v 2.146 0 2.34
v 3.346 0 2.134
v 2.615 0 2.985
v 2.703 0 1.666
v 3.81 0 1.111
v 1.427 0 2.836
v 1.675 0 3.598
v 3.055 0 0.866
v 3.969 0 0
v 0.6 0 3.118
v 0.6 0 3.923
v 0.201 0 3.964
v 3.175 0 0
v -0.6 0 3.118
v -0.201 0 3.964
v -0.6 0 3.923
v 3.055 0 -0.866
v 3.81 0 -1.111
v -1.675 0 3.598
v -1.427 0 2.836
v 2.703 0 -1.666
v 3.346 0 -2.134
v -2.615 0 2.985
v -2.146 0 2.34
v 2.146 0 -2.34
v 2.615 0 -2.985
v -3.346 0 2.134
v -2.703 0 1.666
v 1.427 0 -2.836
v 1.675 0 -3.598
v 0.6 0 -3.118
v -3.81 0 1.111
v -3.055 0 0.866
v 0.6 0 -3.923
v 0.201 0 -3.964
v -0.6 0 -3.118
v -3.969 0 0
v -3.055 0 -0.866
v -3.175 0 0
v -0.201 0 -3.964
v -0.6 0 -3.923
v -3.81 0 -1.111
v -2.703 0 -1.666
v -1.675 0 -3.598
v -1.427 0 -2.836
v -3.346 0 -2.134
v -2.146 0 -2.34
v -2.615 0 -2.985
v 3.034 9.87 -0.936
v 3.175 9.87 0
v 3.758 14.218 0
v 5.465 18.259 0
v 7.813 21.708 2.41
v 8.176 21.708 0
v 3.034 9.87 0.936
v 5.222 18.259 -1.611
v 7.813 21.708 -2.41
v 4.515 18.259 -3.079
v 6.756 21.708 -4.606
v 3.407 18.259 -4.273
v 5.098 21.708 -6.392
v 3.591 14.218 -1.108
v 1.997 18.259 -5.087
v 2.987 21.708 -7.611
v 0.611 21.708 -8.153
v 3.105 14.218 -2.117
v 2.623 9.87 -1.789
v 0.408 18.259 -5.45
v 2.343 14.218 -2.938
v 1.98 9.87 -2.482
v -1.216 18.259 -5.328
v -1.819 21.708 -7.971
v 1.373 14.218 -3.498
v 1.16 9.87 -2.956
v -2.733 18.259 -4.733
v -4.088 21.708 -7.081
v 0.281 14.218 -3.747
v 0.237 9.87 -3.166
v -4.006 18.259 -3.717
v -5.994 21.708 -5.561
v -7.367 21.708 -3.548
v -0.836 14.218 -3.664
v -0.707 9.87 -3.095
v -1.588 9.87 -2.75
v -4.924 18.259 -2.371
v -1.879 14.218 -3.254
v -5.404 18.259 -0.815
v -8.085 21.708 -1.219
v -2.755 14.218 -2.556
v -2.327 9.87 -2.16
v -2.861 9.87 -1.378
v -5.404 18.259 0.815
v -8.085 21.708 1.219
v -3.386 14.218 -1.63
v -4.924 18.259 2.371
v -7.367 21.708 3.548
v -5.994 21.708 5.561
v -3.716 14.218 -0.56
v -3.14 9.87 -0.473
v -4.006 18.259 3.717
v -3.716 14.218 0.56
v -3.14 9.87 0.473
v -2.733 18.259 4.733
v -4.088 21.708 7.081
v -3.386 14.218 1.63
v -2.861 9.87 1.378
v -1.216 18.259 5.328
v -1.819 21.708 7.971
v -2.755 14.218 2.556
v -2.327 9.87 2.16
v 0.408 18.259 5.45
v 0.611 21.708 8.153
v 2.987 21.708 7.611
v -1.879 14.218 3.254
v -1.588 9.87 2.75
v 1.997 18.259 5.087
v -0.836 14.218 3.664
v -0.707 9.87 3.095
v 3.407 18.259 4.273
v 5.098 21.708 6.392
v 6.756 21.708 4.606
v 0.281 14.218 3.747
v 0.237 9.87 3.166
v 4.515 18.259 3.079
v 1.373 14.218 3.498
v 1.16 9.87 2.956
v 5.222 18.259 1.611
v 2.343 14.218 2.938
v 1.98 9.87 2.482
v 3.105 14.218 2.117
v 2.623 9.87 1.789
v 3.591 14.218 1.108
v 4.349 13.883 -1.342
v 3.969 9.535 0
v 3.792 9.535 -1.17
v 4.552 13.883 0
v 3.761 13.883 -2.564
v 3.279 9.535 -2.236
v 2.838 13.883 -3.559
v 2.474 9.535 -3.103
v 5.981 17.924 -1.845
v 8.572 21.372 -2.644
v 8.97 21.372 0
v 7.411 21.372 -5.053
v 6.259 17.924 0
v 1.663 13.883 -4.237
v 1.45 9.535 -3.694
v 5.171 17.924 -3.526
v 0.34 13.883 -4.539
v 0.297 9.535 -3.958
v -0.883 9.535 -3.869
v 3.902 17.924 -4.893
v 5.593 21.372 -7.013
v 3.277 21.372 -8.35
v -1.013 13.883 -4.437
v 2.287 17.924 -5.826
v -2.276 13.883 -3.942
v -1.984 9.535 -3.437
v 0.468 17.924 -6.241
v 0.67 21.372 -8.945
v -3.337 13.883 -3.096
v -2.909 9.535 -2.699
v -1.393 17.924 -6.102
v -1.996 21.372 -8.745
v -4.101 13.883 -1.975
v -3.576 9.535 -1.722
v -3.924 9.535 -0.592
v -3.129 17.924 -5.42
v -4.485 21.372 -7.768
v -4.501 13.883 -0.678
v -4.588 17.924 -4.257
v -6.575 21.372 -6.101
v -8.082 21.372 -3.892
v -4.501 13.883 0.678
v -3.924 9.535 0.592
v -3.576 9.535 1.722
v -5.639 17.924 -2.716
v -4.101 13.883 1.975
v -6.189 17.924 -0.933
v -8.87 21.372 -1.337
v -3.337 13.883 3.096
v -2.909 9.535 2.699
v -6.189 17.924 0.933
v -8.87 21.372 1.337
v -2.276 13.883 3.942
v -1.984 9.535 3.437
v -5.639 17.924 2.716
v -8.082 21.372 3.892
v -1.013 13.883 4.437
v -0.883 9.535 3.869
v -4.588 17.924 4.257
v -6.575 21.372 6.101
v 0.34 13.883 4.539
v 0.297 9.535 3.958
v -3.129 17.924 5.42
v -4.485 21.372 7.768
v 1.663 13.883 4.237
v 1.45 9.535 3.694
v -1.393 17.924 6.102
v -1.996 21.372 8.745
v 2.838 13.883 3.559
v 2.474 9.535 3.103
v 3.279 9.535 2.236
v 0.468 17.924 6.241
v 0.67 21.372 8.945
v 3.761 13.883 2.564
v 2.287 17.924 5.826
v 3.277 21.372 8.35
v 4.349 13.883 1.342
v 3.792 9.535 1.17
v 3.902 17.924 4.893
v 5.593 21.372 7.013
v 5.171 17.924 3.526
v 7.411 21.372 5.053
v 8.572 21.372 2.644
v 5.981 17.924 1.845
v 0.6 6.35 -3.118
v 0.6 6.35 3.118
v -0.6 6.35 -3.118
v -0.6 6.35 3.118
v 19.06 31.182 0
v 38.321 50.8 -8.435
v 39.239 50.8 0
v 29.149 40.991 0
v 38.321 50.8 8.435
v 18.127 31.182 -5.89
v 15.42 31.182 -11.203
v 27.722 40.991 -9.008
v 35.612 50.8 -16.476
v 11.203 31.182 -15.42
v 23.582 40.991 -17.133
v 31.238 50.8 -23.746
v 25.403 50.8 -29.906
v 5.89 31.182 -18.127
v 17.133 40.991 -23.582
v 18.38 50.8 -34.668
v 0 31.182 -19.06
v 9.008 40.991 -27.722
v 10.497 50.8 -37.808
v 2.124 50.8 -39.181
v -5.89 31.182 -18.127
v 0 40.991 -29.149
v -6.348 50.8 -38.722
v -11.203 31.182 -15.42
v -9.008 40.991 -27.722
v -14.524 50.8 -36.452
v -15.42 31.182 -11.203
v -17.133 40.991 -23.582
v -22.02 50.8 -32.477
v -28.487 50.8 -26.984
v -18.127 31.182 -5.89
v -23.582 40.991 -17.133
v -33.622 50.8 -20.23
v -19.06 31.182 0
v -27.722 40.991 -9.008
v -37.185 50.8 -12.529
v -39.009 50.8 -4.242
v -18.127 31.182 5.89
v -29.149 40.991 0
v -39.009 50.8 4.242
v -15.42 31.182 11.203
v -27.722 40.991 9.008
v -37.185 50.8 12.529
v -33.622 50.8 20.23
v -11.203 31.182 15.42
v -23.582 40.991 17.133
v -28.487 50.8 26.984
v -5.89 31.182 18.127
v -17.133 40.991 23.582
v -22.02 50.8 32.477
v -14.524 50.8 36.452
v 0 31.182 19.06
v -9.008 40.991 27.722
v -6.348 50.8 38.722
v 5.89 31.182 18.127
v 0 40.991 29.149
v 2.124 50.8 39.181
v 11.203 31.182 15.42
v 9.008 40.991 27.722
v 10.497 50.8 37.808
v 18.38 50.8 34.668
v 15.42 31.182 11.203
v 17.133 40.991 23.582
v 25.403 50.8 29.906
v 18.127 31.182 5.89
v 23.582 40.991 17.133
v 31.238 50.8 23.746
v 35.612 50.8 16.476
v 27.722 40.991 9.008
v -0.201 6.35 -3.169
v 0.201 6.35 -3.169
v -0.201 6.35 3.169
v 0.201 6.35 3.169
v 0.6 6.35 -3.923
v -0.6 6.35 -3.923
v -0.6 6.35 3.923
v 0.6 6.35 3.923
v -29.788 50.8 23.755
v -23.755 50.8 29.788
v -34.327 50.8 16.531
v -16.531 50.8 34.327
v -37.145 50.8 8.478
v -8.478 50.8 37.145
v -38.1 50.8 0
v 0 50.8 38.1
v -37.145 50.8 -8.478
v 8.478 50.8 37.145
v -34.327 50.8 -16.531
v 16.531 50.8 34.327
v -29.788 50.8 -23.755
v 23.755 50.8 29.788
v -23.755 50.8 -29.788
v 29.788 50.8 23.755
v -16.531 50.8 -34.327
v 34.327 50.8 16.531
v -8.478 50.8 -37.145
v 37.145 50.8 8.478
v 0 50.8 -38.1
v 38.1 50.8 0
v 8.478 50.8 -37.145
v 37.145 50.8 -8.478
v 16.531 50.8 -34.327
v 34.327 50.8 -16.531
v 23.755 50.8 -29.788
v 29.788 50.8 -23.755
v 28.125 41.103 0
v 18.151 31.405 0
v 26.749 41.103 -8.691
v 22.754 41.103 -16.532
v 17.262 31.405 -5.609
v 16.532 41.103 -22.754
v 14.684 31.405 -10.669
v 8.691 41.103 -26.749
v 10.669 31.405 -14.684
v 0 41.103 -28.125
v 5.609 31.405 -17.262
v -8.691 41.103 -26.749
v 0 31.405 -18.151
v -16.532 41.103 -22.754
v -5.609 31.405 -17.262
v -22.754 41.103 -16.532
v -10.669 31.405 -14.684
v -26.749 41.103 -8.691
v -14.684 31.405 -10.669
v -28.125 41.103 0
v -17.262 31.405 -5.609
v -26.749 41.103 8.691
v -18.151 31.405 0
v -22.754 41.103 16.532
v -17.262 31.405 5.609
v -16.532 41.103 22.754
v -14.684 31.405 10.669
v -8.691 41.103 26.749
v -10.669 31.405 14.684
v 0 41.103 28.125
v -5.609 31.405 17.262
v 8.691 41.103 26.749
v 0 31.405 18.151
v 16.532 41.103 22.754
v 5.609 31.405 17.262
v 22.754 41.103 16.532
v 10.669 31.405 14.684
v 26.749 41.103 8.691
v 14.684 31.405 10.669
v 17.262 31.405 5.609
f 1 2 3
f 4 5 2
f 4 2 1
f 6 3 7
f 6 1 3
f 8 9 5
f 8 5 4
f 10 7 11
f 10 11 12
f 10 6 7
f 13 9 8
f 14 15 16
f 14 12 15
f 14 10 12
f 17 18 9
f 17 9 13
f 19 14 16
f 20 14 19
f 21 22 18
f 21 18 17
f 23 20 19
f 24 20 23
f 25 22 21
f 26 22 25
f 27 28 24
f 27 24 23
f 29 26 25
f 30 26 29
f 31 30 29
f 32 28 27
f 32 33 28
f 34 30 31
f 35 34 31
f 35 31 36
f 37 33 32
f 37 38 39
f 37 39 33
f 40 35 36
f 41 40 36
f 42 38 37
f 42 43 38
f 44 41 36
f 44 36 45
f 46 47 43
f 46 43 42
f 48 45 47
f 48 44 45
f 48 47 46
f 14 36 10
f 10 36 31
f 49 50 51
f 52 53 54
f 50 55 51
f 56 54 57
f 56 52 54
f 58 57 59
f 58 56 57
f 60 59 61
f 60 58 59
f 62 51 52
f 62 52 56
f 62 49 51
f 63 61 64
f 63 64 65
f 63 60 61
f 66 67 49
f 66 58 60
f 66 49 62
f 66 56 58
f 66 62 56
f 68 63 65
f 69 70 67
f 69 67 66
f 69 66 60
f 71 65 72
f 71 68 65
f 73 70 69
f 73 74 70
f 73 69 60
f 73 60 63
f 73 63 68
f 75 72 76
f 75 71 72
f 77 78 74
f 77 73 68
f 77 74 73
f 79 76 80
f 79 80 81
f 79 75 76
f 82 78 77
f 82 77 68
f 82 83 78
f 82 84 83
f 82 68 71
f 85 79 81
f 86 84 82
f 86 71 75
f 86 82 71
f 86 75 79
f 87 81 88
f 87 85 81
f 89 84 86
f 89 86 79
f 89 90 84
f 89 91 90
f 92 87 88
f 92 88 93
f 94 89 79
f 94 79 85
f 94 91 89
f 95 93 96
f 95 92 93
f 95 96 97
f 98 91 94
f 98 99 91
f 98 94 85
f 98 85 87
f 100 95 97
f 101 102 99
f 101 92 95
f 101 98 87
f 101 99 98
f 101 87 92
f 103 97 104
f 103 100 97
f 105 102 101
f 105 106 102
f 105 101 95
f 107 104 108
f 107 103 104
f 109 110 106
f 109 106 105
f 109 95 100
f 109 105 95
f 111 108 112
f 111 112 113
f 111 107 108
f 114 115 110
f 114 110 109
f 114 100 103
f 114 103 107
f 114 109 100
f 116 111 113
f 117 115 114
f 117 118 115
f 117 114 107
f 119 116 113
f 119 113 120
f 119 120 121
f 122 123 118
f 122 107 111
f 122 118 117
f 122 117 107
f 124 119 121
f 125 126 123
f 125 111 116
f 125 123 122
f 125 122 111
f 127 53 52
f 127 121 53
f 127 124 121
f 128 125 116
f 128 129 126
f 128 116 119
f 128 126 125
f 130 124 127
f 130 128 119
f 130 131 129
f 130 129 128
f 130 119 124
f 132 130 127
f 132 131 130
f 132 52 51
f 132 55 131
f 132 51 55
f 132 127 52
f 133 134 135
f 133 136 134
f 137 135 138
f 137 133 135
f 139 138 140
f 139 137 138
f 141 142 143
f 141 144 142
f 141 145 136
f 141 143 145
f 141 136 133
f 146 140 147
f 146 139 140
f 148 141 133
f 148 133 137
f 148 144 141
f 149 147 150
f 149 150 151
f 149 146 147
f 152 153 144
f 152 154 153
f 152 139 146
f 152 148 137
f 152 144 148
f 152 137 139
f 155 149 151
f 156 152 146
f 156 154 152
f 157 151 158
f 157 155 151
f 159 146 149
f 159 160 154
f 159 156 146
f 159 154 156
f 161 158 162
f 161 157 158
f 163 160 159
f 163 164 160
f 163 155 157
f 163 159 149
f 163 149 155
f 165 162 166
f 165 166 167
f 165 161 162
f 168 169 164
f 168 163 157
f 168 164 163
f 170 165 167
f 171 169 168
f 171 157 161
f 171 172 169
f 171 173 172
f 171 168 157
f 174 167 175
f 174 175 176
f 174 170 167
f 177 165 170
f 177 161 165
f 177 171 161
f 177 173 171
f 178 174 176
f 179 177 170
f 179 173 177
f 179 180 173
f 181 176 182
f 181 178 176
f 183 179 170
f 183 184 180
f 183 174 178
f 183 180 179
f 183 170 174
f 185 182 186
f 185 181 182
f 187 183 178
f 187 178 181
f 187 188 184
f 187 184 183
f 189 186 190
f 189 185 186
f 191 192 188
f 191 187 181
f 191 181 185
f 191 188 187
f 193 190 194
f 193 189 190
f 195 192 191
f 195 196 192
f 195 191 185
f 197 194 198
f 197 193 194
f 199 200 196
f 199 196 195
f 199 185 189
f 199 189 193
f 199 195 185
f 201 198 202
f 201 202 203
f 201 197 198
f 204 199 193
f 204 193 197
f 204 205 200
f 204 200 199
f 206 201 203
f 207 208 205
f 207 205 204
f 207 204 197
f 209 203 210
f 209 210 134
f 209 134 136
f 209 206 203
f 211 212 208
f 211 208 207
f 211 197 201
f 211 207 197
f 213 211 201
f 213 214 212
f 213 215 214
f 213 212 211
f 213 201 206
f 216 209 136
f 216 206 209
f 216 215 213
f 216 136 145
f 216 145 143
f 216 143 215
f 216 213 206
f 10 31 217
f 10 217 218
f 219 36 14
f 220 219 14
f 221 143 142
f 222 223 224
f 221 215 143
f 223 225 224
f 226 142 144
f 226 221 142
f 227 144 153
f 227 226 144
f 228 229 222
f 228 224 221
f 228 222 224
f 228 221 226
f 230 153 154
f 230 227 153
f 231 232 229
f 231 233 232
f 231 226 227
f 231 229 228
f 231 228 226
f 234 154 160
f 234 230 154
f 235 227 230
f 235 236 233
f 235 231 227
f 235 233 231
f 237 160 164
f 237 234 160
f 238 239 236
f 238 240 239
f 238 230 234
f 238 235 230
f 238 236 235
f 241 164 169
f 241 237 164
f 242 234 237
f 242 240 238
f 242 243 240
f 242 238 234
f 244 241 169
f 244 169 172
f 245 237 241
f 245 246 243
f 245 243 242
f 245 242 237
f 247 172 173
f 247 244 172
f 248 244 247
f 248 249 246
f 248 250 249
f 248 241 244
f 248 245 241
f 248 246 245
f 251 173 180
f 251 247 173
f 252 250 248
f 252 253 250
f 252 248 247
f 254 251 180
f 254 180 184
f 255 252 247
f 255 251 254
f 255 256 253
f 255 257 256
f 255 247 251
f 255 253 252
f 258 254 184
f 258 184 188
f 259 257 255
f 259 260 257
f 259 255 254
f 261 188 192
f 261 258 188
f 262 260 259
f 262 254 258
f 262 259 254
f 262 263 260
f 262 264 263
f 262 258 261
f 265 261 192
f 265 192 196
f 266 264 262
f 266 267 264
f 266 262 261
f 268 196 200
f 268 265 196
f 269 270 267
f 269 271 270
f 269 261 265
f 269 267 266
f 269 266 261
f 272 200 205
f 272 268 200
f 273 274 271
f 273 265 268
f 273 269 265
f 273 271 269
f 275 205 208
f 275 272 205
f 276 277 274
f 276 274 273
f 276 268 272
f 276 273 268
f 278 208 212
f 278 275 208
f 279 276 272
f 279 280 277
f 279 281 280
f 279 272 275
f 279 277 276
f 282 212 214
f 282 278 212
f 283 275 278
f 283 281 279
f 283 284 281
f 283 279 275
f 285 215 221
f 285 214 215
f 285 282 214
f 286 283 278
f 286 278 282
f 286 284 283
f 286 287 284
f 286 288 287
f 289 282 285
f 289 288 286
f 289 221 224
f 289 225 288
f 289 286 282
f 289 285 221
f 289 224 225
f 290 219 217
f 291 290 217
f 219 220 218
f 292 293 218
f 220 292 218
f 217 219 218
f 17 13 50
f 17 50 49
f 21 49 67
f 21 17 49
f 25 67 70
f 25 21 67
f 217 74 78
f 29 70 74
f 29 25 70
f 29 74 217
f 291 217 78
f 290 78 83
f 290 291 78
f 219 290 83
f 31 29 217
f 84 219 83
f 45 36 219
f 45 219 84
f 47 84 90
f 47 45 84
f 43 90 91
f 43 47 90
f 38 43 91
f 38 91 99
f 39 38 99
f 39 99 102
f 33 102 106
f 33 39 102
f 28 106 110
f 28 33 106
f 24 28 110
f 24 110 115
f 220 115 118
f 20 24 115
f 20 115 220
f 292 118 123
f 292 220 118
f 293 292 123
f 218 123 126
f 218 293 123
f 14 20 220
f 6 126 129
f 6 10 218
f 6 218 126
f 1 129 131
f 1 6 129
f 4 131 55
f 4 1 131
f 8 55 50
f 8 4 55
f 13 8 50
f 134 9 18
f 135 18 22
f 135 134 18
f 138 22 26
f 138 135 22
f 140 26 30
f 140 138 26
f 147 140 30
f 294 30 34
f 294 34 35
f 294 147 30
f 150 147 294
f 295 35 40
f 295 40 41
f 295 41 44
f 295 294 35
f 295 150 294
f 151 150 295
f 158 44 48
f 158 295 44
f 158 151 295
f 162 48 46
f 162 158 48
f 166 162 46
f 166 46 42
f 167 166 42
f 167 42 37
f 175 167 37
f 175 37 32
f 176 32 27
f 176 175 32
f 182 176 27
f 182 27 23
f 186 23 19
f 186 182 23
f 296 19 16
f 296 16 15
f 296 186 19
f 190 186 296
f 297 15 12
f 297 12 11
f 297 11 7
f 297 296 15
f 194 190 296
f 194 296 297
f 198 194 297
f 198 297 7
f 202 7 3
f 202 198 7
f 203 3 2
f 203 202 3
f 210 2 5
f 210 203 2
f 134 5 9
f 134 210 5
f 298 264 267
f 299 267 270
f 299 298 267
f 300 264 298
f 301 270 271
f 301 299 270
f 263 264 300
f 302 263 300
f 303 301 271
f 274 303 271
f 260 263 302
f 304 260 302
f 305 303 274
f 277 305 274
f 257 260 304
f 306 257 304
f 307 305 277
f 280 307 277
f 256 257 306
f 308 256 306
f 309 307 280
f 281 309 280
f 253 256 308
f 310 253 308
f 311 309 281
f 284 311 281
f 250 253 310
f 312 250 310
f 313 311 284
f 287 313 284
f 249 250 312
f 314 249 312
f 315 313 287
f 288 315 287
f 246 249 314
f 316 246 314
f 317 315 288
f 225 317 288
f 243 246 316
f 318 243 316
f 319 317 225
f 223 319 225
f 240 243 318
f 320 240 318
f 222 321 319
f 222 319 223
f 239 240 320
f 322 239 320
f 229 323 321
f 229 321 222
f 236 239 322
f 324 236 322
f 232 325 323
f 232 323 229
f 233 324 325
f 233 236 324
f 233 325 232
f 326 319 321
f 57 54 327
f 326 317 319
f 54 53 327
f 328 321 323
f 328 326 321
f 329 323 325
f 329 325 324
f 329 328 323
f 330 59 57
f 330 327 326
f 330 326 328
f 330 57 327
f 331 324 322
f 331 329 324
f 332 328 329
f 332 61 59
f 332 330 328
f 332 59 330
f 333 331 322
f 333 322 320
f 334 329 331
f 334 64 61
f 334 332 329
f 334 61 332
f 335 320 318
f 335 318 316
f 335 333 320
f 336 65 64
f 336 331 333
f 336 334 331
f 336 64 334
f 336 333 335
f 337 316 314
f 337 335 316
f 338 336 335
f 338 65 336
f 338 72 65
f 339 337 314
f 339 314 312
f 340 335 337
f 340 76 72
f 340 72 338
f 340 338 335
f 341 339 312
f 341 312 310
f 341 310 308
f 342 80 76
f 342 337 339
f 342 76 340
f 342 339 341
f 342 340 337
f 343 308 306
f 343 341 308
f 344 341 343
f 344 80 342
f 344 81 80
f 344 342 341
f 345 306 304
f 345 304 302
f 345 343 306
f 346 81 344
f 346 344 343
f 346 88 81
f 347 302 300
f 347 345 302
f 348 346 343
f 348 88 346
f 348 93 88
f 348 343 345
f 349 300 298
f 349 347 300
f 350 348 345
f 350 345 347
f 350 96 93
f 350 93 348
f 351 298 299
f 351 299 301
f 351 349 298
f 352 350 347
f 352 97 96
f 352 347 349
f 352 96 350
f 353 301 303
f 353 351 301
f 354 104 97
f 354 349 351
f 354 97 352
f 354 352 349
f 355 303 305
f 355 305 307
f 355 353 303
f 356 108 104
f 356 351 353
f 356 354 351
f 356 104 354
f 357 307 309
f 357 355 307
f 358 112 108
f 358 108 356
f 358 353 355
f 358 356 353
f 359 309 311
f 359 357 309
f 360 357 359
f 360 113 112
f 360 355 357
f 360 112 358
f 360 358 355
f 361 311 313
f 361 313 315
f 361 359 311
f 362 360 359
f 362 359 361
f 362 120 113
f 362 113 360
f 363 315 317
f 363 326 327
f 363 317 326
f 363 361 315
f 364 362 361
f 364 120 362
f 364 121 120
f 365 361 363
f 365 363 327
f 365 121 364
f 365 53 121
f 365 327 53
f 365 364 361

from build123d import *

# Parameters (mm, degrees)
ESQUISSE4_W        = 1.2
ESQUISSE4_H        = 7.846267026
BOSS_EXTRU_1_DEPTH = 6.35


with BuildPart() as part:
    # Esquisse1 → Révolution1 (revolve)
    with BuildSketch(Plane.XY):
        with BuildLine():
            Line((3.96875, 0), (3.96875, 9.534696006))
            ThreePointArc((3.96875, 9.534696006), (5.270377511, 15.960075858), (8.970022713, 21.372318074))
            Line((8.970022713, 21.372318074), (39.238684771, 50.8))
            Line((39.238684771, 50.8), (38.1, 50.8))
            Line((38.1, 50.8), (8.176272713, 21.707669228))
            ThreePointArc((8.176272713, 21.707669228), (4.476627511, 16.295427012), (3.175, 9.87004716))
            Line((3.175, 9.87004716), (3.175, 0))
            Line((3.175, 0), (3.96875, 0))
        make_face()
    revolve(axis=Axis((0, 0, 0), (0, 1, 0)))

    # Esquisse4 → Boss.-Extru.1 (add)
    with BuildSketch(Plane.XZ):
        Rectangle(ESQUISSE4_W, ESQUISSE4_H)
    extrude(amount=-BOSS_EXTRU_1_DEPTH)


solid = part.part
